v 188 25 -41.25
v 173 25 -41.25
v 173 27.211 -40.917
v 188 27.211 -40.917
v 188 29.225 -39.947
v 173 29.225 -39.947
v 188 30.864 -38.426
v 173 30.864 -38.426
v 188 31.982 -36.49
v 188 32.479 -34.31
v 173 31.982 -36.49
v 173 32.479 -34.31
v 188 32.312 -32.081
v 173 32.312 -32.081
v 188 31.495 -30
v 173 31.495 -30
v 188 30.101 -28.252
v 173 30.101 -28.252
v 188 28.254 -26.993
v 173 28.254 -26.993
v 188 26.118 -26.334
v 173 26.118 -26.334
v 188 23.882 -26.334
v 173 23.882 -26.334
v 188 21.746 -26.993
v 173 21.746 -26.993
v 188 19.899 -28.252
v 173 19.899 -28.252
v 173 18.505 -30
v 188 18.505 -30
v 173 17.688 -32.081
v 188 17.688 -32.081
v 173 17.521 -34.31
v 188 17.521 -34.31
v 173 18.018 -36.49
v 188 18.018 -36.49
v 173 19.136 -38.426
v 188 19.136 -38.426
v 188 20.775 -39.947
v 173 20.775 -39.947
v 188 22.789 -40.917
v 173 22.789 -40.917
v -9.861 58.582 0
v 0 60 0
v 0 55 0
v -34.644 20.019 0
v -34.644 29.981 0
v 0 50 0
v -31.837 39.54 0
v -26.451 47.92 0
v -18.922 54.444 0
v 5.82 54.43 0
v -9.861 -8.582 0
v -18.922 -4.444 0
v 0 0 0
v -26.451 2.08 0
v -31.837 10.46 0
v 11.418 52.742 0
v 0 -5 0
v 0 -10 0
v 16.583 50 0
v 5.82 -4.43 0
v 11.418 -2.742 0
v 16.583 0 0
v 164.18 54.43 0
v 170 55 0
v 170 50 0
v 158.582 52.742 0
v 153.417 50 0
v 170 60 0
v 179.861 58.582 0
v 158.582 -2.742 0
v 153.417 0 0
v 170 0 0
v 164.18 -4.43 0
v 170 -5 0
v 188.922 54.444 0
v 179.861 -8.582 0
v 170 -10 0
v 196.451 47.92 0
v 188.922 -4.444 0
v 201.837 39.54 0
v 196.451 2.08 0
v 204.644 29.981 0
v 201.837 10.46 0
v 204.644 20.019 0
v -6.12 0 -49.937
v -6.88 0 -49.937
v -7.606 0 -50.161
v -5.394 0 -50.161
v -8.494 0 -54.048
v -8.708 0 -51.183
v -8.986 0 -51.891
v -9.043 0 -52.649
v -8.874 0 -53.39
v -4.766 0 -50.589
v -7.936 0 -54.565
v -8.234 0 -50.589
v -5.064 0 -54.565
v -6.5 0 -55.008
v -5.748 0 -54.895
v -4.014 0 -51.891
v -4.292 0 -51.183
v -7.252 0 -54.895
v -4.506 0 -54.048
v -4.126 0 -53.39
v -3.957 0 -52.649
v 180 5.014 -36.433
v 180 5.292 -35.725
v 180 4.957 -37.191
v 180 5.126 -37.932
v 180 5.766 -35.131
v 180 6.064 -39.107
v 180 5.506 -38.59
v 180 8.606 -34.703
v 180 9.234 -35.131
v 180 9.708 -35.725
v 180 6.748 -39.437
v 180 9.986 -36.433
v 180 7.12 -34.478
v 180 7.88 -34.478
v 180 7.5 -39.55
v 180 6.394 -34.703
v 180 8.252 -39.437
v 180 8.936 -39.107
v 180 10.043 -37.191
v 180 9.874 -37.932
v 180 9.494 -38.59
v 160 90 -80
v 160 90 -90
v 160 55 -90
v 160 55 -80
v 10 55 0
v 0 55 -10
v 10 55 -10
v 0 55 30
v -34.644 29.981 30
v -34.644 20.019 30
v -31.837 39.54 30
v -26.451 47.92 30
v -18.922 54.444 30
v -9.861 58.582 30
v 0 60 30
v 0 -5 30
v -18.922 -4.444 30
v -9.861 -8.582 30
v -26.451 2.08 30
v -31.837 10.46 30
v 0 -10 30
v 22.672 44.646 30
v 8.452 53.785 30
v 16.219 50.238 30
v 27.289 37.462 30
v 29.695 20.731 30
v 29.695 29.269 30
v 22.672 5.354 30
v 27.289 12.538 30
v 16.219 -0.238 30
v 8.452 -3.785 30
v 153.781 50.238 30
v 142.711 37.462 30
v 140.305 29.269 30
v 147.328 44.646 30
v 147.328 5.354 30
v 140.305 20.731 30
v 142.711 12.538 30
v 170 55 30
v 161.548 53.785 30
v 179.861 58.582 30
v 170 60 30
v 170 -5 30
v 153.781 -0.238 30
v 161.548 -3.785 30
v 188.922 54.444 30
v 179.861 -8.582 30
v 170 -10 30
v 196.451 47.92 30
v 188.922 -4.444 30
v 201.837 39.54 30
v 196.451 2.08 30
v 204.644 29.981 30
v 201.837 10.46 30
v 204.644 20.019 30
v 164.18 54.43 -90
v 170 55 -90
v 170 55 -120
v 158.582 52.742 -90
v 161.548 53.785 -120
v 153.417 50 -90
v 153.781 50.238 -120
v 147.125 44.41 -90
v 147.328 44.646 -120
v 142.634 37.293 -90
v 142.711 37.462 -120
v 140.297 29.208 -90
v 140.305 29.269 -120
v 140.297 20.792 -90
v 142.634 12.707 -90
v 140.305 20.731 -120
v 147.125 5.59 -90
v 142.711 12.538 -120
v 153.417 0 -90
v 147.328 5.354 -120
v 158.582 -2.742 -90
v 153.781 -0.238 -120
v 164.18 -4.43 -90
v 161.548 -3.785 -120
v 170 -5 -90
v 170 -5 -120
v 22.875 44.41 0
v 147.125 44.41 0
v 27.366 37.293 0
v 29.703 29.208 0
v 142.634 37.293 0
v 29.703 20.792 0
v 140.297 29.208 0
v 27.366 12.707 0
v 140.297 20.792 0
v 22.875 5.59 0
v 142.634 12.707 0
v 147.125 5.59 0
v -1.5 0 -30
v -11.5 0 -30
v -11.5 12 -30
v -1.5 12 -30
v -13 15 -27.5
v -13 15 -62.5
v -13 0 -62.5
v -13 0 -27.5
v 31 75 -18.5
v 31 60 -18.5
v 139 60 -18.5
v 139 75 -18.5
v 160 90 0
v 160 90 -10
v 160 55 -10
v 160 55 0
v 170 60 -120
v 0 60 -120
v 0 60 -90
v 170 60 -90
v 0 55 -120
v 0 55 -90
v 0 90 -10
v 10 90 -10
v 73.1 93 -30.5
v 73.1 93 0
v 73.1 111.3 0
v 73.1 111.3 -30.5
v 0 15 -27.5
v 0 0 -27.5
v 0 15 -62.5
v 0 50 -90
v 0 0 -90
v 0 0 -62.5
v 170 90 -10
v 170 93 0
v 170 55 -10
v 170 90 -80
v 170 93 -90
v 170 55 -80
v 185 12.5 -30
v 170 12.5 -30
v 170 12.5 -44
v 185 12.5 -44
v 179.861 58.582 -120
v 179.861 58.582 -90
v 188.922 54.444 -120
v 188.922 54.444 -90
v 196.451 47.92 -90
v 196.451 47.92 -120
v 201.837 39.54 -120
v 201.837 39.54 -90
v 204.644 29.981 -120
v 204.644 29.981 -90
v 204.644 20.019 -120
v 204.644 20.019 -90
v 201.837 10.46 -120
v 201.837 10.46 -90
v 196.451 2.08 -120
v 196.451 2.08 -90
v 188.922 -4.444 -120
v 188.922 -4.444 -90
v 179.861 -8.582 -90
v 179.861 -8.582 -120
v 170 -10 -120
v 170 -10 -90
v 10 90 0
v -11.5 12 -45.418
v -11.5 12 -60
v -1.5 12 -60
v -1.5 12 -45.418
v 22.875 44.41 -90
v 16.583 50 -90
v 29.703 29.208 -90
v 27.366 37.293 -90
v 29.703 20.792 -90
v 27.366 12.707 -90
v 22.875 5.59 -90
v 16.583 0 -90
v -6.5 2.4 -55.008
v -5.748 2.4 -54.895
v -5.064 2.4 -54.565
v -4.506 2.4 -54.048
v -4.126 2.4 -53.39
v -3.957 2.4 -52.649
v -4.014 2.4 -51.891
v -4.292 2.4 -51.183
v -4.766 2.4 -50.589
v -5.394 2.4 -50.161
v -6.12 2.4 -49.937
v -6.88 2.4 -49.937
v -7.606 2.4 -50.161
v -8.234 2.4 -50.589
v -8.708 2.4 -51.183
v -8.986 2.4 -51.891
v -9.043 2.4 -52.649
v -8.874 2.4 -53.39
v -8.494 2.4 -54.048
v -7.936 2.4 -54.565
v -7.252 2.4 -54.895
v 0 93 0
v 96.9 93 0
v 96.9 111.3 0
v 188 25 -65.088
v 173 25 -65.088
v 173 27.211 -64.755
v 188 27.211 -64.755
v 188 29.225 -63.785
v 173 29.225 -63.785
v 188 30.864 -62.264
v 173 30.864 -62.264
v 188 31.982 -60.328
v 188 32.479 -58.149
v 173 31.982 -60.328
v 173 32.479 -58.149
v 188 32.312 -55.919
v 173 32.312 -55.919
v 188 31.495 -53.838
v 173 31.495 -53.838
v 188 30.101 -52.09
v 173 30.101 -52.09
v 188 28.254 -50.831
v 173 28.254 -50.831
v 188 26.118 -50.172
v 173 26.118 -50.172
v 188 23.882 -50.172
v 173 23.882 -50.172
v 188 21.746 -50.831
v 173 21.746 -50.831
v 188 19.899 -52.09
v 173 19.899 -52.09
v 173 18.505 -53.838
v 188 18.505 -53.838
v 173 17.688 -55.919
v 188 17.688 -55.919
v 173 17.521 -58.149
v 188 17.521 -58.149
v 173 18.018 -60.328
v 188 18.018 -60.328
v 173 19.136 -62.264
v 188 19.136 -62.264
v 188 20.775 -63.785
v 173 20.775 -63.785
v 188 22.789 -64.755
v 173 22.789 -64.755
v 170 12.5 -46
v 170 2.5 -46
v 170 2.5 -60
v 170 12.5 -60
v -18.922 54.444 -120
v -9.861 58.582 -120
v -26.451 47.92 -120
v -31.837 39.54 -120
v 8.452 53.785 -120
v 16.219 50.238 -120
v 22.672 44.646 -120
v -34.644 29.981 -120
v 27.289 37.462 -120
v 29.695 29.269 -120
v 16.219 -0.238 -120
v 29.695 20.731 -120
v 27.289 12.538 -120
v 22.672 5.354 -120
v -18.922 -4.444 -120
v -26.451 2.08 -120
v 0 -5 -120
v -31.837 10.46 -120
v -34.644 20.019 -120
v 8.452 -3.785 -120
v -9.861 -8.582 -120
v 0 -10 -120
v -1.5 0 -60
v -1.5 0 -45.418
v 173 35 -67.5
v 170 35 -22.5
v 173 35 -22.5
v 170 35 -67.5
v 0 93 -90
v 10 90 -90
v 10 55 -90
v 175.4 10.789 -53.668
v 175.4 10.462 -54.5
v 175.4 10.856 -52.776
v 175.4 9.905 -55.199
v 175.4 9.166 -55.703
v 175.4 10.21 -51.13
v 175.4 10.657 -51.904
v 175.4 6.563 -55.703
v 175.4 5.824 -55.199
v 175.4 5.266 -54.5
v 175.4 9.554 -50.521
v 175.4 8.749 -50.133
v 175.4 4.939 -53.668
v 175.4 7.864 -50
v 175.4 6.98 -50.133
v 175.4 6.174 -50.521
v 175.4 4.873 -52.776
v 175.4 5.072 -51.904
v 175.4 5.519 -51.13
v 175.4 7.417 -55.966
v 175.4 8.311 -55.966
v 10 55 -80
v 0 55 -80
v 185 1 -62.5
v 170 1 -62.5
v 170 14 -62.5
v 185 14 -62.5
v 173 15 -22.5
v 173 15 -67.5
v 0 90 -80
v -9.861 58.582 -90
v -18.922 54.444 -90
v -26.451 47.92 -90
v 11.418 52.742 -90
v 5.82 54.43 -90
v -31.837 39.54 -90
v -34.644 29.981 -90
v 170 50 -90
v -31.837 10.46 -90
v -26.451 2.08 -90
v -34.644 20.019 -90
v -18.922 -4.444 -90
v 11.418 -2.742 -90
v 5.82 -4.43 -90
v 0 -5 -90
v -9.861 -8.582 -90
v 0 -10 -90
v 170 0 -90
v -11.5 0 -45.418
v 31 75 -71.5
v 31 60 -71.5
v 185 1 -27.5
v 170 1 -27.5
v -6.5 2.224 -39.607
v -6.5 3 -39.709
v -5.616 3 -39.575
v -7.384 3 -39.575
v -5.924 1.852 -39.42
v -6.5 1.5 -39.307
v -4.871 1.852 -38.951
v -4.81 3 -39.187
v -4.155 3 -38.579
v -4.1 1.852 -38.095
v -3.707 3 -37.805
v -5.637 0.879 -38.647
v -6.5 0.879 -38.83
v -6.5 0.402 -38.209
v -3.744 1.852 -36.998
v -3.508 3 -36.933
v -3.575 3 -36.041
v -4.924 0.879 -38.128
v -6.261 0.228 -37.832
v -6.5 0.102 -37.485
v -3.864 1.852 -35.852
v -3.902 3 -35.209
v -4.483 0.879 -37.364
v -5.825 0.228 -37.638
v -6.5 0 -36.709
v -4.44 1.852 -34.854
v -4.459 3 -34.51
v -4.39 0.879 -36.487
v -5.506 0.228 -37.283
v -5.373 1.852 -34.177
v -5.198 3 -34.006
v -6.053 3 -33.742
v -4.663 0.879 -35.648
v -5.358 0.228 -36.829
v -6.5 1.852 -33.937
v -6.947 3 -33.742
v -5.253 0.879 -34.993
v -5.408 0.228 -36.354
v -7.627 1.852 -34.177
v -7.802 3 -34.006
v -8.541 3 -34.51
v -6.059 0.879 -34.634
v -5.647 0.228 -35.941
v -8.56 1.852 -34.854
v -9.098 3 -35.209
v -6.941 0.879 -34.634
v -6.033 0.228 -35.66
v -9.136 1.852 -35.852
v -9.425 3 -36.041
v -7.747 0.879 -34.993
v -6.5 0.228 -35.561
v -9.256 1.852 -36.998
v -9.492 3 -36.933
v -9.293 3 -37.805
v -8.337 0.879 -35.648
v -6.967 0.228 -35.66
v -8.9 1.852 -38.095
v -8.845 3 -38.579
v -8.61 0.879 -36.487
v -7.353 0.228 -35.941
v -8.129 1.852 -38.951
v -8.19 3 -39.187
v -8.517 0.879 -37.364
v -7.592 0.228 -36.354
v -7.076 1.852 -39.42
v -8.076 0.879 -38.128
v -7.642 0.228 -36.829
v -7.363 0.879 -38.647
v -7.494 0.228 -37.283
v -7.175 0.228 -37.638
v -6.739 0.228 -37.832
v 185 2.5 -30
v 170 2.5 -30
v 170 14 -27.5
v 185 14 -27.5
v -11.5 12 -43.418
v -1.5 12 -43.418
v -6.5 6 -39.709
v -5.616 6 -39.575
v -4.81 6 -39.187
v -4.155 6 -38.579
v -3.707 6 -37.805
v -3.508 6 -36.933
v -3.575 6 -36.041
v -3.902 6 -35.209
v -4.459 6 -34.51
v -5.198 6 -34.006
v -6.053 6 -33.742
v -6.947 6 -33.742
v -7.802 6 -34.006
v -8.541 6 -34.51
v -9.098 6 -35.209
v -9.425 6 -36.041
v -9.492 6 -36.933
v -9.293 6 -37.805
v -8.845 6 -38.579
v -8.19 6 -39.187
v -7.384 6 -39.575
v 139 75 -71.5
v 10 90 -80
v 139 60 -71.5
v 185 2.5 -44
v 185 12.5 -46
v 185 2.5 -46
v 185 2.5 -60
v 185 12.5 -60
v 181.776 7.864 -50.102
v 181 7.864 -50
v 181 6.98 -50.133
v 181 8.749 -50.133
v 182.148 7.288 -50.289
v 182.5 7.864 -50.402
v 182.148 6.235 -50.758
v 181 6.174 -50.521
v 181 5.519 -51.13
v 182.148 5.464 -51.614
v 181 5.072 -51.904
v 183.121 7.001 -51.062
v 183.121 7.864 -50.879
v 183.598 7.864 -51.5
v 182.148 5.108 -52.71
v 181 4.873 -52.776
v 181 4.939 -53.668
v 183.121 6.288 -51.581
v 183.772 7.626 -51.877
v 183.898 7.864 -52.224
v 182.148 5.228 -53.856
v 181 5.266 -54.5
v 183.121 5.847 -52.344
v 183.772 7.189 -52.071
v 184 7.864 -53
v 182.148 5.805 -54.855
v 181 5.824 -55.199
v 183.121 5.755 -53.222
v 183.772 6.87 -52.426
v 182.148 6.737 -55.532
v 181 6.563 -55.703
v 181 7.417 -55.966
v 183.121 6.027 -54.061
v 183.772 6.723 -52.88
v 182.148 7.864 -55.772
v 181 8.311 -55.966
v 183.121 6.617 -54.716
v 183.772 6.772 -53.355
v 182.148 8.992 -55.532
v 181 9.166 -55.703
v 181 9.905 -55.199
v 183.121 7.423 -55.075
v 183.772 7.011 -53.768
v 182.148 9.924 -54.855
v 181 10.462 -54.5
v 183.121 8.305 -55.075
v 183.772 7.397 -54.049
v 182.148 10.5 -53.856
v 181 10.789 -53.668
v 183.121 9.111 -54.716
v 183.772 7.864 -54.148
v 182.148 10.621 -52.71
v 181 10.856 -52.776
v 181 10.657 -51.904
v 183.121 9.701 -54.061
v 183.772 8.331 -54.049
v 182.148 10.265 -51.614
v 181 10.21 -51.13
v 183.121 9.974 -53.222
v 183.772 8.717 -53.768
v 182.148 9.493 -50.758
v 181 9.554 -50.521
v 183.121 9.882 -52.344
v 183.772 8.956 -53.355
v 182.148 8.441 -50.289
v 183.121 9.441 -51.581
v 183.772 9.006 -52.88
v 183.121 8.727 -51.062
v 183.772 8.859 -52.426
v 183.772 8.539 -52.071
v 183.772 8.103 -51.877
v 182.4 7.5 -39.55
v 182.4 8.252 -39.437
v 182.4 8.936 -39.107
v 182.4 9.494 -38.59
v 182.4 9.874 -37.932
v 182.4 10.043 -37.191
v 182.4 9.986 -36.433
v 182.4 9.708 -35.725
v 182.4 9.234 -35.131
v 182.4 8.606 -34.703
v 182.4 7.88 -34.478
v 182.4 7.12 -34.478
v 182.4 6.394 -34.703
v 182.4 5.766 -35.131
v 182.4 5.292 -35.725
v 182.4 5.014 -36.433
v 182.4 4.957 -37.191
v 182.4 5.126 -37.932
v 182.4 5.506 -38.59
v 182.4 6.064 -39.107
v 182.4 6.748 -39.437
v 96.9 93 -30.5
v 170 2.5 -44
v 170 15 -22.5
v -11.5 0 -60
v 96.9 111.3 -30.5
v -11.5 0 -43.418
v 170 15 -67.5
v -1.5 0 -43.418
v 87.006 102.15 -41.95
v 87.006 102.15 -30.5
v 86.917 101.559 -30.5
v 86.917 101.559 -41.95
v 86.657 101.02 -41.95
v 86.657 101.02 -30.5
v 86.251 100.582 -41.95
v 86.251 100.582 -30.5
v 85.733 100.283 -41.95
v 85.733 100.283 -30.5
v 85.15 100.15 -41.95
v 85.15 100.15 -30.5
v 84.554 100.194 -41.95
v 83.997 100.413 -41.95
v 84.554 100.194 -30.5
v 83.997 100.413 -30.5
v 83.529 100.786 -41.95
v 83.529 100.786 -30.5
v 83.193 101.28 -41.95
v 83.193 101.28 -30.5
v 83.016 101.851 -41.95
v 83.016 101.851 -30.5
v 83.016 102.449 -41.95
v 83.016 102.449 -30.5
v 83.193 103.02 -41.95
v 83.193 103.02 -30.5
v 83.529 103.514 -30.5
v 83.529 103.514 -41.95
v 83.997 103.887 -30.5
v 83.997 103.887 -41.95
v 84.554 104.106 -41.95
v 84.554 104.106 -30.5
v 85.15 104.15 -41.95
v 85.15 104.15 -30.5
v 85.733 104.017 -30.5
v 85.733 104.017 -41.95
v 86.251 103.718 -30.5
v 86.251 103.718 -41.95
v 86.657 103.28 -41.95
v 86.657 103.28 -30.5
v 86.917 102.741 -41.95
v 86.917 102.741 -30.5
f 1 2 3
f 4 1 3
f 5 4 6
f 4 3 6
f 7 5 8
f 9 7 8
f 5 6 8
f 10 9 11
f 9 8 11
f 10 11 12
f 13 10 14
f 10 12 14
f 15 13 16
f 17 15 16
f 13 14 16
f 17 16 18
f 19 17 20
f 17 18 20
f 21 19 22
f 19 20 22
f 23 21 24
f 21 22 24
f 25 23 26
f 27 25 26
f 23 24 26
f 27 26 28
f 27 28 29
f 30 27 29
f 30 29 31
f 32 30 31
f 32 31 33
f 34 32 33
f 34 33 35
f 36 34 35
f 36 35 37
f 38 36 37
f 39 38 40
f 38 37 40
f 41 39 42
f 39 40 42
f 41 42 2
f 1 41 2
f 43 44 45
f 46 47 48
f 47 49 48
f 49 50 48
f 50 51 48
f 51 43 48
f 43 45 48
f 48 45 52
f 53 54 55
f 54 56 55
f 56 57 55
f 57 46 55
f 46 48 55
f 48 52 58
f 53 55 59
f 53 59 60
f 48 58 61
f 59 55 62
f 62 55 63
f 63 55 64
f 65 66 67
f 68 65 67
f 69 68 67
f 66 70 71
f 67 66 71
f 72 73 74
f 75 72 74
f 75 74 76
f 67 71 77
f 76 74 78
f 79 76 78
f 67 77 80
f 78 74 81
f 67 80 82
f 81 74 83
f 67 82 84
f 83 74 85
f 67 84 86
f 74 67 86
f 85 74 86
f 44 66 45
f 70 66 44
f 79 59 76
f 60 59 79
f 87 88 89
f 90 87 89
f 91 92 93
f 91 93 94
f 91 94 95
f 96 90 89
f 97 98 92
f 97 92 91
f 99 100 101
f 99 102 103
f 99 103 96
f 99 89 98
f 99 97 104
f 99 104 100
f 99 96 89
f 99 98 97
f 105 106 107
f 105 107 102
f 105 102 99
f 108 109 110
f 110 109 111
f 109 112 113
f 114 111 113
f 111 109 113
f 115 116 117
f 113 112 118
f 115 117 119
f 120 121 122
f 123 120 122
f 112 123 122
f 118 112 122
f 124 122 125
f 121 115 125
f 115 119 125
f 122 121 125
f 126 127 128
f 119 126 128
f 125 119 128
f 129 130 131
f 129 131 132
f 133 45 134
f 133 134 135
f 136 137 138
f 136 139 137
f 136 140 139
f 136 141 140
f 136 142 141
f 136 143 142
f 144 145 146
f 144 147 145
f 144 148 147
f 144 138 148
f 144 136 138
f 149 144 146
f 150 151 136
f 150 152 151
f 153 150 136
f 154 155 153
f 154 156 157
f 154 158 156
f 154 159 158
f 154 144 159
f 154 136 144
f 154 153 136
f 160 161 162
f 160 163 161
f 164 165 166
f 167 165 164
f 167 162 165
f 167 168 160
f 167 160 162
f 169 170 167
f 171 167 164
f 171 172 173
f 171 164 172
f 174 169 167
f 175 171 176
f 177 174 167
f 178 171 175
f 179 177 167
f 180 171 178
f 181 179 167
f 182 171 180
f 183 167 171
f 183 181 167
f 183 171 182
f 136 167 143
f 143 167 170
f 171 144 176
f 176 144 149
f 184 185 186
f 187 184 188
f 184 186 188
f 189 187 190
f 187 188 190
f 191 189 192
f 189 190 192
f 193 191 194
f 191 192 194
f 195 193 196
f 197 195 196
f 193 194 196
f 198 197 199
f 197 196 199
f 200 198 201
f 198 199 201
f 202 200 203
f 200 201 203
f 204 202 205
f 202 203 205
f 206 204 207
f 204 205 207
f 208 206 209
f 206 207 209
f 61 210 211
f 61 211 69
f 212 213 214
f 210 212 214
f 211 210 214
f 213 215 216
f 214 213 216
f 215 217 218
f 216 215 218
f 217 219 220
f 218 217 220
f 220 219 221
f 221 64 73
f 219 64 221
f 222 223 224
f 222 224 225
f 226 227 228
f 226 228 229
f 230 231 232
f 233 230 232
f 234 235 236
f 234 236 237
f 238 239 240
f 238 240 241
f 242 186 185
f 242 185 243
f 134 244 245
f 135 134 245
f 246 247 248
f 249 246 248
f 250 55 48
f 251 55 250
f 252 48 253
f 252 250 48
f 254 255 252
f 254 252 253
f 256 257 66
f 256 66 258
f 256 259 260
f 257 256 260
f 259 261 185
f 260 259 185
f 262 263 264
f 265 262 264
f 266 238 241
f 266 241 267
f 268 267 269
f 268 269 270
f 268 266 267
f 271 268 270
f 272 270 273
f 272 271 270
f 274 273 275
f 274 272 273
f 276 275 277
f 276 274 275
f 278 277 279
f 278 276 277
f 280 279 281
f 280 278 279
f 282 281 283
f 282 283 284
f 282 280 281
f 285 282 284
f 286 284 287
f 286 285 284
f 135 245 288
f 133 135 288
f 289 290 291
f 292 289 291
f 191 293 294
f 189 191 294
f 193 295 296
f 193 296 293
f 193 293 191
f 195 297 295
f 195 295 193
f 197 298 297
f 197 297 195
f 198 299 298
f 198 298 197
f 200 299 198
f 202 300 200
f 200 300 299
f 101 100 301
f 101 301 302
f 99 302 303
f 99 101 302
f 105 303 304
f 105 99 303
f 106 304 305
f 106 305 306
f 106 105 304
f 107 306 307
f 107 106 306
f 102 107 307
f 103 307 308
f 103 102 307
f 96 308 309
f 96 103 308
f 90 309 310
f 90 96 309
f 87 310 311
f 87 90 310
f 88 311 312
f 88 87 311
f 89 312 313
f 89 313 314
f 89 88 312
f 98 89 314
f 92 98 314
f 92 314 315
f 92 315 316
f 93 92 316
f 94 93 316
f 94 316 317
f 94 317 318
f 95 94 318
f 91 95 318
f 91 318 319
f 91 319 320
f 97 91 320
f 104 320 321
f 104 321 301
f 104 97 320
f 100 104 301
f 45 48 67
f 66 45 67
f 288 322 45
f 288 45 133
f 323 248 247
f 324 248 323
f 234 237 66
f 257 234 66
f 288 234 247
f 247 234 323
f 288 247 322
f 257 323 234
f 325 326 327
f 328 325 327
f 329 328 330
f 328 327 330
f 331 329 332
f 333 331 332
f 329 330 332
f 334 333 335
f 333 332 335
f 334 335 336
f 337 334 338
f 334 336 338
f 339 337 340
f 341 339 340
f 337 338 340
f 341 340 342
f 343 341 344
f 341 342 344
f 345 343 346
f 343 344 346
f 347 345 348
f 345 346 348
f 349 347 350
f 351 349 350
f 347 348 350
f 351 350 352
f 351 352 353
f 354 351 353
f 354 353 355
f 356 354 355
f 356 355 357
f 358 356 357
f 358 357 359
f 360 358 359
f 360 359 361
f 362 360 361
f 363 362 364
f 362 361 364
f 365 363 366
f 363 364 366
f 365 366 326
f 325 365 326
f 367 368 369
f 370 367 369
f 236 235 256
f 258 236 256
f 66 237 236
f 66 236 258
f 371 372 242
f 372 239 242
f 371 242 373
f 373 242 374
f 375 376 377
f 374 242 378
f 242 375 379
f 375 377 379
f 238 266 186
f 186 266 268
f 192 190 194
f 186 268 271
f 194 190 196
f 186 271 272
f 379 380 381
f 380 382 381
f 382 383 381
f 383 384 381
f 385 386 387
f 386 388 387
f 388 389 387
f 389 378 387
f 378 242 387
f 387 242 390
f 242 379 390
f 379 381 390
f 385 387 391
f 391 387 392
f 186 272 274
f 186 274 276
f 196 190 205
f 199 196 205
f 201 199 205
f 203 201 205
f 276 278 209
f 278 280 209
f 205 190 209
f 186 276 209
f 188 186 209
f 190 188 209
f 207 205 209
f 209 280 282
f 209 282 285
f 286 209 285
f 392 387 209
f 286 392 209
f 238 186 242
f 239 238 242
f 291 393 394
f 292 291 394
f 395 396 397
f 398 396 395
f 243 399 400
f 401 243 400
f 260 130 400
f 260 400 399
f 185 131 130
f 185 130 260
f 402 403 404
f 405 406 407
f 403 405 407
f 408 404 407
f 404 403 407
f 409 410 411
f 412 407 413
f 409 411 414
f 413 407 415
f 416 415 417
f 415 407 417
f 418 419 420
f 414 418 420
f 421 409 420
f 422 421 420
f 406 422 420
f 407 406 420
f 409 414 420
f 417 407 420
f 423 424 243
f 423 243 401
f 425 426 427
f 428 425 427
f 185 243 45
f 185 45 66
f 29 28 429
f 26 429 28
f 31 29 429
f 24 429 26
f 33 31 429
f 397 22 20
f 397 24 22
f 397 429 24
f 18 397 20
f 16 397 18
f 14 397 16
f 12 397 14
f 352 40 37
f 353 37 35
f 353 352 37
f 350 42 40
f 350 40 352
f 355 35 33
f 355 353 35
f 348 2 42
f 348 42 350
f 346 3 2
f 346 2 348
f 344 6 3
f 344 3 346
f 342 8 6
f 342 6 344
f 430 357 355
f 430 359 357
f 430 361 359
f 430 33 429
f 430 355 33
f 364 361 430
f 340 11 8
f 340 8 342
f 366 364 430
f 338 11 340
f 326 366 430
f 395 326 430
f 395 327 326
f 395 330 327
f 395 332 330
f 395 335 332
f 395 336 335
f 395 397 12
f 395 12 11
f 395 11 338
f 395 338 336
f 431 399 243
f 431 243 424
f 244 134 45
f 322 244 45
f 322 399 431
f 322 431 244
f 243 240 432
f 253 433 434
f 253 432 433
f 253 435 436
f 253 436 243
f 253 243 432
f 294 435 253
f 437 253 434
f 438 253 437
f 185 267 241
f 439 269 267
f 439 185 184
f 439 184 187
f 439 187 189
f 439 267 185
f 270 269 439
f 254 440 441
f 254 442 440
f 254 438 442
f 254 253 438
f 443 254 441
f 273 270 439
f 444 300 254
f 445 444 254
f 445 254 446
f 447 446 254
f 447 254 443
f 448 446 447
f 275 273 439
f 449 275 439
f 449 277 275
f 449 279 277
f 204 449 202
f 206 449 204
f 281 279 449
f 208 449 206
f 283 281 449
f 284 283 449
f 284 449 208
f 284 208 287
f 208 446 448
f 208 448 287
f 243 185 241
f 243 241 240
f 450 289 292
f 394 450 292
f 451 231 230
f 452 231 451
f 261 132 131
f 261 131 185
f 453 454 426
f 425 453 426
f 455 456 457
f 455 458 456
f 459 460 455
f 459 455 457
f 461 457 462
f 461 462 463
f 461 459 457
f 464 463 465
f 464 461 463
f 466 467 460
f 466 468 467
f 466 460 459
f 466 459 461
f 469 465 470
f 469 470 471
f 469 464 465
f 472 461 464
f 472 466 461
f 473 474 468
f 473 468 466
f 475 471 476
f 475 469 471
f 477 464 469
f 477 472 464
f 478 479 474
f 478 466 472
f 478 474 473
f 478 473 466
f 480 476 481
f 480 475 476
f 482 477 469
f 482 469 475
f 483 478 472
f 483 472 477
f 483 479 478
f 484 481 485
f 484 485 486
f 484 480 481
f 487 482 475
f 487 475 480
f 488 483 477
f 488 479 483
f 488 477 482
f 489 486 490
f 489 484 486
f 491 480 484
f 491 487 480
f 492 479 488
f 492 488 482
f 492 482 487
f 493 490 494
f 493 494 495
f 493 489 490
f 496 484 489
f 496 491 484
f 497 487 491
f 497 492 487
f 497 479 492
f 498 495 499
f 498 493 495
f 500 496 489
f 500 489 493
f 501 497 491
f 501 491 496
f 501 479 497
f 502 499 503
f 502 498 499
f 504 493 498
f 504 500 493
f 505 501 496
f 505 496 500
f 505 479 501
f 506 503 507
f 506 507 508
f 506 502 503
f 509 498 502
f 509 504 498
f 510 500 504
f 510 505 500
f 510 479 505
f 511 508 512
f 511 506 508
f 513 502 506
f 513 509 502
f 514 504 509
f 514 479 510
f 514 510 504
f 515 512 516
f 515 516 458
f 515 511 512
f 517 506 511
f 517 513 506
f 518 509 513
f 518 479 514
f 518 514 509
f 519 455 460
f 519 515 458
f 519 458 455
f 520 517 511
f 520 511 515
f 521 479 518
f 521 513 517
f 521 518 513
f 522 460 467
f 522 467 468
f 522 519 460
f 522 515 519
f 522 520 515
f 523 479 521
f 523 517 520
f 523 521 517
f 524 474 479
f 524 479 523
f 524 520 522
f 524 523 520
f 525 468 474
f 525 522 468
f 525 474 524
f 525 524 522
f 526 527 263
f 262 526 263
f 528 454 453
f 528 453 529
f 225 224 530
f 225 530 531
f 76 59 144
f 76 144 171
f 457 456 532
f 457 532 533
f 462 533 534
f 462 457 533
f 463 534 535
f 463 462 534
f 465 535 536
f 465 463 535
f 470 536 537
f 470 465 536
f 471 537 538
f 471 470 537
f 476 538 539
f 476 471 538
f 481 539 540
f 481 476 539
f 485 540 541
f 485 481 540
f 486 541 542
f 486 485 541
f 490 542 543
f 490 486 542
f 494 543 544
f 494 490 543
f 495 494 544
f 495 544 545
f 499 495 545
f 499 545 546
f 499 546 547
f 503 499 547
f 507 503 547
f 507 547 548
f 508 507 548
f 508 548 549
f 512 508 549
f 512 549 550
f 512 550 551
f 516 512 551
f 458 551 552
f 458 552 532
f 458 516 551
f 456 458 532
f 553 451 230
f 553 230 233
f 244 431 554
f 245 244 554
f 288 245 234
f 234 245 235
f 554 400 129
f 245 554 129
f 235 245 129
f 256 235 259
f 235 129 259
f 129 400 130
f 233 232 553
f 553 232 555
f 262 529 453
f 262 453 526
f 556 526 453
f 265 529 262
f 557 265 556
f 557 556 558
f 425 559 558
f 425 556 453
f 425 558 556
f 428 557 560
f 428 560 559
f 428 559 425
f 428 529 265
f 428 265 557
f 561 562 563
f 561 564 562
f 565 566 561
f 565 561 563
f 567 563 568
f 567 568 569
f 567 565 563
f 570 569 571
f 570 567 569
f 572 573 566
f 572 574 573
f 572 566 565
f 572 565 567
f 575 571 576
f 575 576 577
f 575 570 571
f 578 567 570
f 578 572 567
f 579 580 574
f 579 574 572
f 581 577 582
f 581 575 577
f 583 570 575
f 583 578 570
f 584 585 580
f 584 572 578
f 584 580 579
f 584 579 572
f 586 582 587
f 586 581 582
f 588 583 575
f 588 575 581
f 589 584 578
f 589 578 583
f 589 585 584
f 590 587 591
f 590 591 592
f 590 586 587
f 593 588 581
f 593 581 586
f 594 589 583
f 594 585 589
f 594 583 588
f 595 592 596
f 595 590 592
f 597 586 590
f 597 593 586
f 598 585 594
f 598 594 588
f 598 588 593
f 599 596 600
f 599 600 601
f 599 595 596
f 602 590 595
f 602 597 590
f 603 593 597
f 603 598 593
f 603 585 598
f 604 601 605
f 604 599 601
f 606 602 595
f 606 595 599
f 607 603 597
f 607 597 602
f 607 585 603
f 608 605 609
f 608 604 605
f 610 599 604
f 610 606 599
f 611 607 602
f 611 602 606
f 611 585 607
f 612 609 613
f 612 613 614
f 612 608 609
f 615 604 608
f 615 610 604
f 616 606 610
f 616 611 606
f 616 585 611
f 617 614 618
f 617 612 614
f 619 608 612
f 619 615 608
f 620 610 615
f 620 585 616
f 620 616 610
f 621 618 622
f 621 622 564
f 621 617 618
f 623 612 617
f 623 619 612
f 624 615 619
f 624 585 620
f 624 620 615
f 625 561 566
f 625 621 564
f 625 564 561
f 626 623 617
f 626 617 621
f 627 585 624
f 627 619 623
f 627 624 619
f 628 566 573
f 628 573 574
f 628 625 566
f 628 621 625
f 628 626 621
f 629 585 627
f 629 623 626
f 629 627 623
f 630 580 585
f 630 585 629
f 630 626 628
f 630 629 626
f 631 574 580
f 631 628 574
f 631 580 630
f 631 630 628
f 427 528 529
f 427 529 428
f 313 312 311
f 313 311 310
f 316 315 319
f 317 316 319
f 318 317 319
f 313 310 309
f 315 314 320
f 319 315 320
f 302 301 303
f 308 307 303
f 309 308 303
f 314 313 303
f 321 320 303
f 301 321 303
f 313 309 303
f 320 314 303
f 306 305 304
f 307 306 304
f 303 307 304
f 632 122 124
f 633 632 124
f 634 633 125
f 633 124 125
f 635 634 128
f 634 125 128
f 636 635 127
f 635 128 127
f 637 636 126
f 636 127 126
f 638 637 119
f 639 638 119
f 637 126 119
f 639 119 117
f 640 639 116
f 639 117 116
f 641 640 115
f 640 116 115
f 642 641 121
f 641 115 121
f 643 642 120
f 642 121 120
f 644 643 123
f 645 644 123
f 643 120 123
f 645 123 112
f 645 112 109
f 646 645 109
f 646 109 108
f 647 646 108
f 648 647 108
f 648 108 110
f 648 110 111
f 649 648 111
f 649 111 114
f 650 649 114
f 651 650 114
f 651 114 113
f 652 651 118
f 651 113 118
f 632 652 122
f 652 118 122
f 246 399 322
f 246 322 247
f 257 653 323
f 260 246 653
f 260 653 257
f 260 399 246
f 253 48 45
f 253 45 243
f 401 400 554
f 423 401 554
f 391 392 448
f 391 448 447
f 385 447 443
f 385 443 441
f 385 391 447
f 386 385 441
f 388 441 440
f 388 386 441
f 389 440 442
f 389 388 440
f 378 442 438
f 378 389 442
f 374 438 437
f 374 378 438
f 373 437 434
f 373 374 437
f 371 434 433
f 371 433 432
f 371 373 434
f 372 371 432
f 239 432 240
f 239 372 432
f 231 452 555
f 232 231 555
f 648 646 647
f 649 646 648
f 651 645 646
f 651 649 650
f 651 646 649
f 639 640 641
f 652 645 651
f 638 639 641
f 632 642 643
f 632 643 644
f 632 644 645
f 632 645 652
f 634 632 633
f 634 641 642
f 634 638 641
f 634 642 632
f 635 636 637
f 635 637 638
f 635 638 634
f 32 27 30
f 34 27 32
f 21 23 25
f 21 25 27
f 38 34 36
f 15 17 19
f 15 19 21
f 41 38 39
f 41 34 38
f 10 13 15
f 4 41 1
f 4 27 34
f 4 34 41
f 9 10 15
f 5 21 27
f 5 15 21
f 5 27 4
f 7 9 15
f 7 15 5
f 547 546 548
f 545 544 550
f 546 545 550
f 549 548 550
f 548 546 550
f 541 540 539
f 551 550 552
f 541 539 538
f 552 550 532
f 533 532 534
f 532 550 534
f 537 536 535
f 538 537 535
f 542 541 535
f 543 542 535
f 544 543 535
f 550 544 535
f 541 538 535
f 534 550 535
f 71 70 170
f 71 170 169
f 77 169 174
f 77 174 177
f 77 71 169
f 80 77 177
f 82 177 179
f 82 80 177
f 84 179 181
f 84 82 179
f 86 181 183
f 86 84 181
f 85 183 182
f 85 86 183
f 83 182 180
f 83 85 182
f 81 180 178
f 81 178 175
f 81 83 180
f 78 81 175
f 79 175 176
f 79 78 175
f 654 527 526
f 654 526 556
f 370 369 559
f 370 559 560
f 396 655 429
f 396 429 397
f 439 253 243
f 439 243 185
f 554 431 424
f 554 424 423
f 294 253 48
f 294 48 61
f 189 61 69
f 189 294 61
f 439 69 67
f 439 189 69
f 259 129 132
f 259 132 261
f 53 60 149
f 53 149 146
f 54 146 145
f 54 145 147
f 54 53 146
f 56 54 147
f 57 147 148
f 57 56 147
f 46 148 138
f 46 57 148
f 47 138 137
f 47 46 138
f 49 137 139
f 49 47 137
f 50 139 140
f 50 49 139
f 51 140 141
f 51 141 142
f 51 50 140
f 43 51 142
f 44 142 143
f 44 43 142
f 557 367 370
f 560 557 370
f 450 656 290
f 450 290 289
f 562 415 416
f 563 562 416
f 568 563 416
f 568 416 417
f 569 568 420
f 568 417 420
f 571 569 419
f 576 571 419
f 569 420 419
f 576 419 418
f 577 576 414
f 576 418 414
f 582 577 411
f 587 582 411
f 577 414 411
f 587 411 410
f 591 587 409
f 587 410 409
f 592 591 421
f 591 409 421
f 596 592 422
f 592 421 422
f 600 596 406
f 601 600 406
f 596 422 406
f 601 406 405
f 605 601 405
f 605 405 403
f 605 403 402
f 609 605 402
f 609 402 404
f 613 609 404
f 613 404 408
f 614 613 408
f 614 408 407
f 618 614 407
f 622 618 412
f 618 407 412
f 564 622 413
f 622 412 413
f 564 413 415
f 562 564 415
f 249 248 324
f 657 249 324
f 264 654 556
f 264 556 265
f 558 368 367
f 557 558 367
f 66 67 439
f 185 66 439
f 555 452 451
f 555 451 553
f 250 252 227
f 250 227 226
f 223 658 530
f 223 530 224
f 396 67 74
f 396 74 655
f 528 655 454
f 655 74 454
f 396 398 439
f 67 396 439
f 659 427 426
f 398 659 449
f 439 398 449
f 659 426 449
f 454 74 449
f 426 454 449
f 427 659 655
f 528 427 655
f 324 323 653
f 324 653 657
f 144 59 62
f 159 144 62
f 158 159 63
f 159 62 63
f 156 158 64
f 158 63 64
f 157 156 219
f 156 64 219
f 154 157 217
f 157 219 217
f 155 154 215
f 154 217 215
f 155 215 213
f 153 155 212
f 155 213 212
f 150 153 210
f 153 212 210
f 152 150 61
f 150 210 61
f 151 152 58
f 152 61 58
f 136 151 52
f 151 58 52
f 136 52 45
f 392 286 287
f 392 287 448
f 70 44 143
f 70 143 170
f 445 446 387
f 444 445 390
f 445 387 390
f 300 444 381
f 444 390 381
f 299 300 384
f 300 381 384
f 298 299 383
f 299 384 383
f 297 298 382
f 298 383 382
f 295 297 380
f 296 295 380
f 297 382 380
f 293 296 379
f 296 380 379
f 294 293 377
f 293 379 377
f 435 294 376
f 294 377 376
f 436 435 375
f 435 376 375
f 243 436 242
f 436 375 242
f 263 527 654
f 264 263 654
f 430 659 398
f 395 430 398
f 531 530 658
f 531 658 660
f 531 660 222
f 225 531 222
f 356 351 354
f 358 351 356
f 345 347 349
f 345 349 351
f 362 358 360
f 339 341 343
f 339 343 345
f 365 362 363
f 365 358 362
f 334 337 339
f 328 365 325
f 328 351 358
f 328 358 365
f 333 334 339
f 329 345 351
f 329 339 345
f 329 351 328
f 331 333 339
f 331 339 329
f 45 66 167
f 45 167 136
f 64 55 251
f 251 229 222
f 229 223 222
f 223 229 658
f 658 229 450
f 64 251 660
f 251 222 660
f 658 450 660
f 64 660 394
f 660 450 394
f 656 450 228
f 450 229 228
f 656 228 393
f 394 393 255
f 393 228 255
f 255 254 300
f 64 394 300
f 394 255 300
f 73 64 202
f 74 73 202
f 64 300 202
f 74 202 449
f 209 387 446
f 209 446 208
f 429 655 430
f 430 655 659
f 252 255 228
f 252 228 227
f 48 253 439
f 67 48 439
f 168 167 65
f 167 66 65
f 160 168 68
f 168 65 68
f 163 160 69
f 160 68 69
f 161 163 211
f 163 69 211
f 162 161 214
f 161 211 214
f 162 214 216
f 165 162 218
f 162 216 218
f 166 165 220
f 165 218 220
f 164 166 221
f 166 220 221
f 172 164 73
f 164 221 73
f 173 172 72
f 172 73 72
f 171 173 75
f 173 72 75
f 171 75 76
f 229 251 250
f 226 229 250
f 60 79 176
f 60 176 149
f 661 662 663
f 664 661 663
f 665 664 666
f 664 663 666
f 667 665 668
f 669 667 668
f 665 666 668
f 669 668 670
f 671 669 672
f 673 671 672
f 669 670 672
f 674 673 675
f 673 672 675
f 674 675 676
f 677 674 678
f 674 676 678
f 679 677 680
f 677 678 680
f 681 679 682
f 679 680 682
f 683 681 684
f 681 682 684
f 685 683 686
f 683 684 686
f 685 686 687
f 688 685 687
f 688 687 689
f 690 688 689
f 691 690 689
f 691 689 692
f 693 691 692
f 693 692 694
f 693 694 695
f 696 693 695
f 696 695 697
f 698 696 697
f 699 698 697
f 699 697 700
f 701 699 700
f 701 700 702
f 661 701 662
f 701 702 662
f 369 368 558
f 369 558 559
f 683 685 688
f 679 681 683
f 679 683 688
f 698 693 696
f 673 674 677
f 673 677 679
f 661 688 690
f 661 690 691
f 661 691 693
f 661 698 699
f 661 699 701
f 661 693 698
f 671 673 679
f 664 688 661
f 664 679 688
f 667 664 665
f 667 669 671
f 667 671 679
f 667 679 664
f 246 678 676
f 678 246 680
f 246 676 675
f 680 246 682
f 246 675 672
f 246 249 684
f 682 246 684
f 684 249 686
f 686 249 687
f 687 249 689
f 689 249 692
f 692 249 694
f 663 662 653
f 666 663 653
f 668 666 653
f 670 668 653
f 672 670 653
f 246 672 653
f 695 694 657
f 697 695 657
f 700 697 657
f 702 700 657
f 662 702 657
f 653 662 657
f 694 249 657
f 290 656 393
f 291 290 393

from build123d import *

# Parameters (mm, degrees)
SKETCH1_W            = 170
SKETCH1_H            = 90
BOSS_EXTRUDE1_DEPTH  = 50
SKETCH2_R            = 30
BOSS_EXTRUDE2_DEPTH  = 30
LPATTERN1_COUNT      = 2
LPATTERN1_PITCH      = 120
BOSS_EXTRUDE3_START  = -30
BOSS_EXTRUDE3_DEPTH  = 30
LPATTERN2_COUNT      = 2
LPATTERN2_PITCH      = 120
SKETCH4_W            = 170
SKETCH4_H            = 90
BOSS_EXTRUDE6_DEPTH  = 5
SKETCH6_W            = 108
SKETCH6_H            = 53
BOSS_EXTRUDE7_DEPTH  = 15
SKETCH7_W            = 170
SKETCH7_H            = 90
BOSS_EXTRUDE8_DEPTH  = 3
SKETCH8_W            = 23.8
SKETCH8_H            = 18.3
BOSS_EXTRUDE9_DEPTH  = 30.5
SKETCH9_R            = 2.00605959
BOSS_EXTRUDE10_DEPTH = 11.45
SKETCH10_W           = 45
SKETCH10_H           = 20
BOSS_EXTRUDE11_DEPTH = 3
SKETCH11_R           = 7.5
BOSS_EXTRUDE12_DEPTH = 15
SKETCH12_W           = 35
SKETCH12_H           = 13
SKETCH12_W_2         = 14
SKETCH12_H_2         = 10
BOSS_EXTRUDE13_DEPTH = 15
SKETCH13_R           = 2.55
BOSS_EXTRUDE14_DEPTH = 2.4
SKETCH14_R           = 3
BOSS_EXTRUDE15_DEPTH = 8.6
FILLET1_R            = 3
SKETCH15_W           = 35
SKETCH15_H           = 15
BOSS_EXTRUDE16_DEPTH = 13
SKETCH17_W           = 10
SKETCH17_H           = 30
CUT_EXTRUDE1_DEPTH   = 12
SKETCH18_W           = 10
SKETCH18_H           = 2
BOSS_EXTRUDE17_DEPTH = 12
SKETCH20_W           = 10
SKETCH20_H           = 10
BOSS_EXTRUDE20_DEPTH = 35
SKETCH21_R           = 2.55
BOSS_EXTRUDE21_DEPTH = 2.4
SKETCH24_R           = 3
BOSS_EXTRUDE22_DEPTH = 6
FILLET2_R            = 3


with BuildPart() as part:
    # Sketch1 → Boss-Extrude1 (new body)
    with BuildSketch(Plane(origin=(0, 0, 0), x_dir=(1, 0, 0), z_dir=(0, 1, 0))):
        with Locations((85, 45)):
            Rectangle(SKETCH1_W, SKETCH1_H)
    extrude(amount=BOSS_EXTRUDE1_DEPTH)

    # Sketch2 → Boss-Extrude2 (add)
    with BuildSketch(Plane.XY):
        with Locations(Location((170, 25, 0), (0, 0, 236.442690238))):
            Circle(SKETCH2_R)
        with Locations(Location((0, 25, 0), (0, 0, 303.557309762))):
            Circle(SKETCH2_R)
    boss_extrude2 = extrude(amount=BOSS_EXTRUDE2_DEPTH)

    # LPattern1: Boss-Extrude2 ×2
    with Locations(*[(0, 0, -i * LPATTERN1_PITCH) for i in range(1, LPATTERN1_COUNT)]):
        add(boss_extrude2)

    # Sketch3 → Boss-Extrude3 (add)
    with BuildSketch(Plane.XY.offset(30).offset(BOSS_EXTRUDE3_START)):
        with BuildLine():
            Line((0, 60), (170, 60))
            ThreePointArc((170, 60), (205, 25), (170, -10))
            Line((170, -10), (0, -10))
            ThreePointArc((0, -10), (-35, 25), (0, 60))
        make_face()
        with BuildLine():
            Line((170, 55), (0, 55))
            ThreePointArc((0, 55), (-30, 25), (0, -5))
            Line((0, -5), (170, -5))
            ThreePointArc((170, -5), (200, 25), (170, 55))
        make_face(mode=Mode.SUBTRACT)
    boss_extrude3 = extrude(amount=BOSS_EXTRUDE3_DEPTH)

    # LPattern2: Boss-Extrude3 ×2
    with Locations(*[(0, 0, -i * LPATTERN2_PITCH) for i in range(1, LPATTERN2_COUNT)]):
        add(boss_extrude3)

    # Sketch10 → Boss-Extrude11 (add)
    with BuildSketch(Plane(origin=(170, 0, 0), x_dir=(0, 0, -1), z_dir=(1, 0, 0))):
        with Locations((45, 25)):
            Rectangle(SKETCH10_W, SKETCH10_H)
    extrude(amount=BOSS_EXTRUDE11_DEPTH)

    # Sketch11 → Boss-Extrude12 (add)
    with BuildSketch(Plane(origin=(173, 0, 0), x_dir=(0, 0, -1), z_dir=(1, 0, 0))):
        with Locations((57.588236396, 25)):
            Circle(SKETCH11_R)
        with Locations((33.75, 25)):
            Circle(SKETCH11_R)
    extrude(amount=BOSS_EXTRUDE12_DEPTH)

    # Sketch12 → Boss-Extrude13 (add)
    with BuildSketch(Plane(origin=(170, 0, 0), x_dir=(0, 0, -1), z_dir=(1, 0, 0))):
        with Locations((45, 7.5)):
            Rectangle(SKETCH12_W, SKETCH12_H)
        with Locations((37, 7.5)):
            Rectangle(SKETCH12_W_2, SKETCH12_H_2, mode=Mode.SUBTRACT)
        with Locations((53, 7.5)):
            Rectangle(SKETCH12_W_2, SKETCH12_H_2, mode=Mode.SUBTRACT)
    extrude(amount=BOSS_EXTRUDE13_DEPTH)

    # Sketch15 → Boss-Extrude16 (add)
    with BuildSketch(Plane.ZY):
        with Locations((-45, 7.5)):
            Rectangle(SKETCH15_W, SKETCH15_H)
    extrude(amount=BOSS_EXTRUDE16_DEPTH)

    # Sketch17 → Cut-Extrude1 (cut)
    with BuildSketch(Plane.XZ):
        with Locations((-6.5, -45)):
            Rectangle(SKETCH17_W, SKETCH17_H)
    extrude(amount=-CUT_EXTRUDE1_DEPTH, mode=Mode.SUBTRACT)

    # Sketch18 → Boss-Extrude17 (add)
    with BuildSketch(Plane.XZ.offset(-12)):
        with Locations((-6.5, -44.41753742)):
            Rectangle(SKETCH18_W, SKETCH18_H)
    extrude(amount=BOSS_EXTRUDE17_DEPTH)


with BuildPart() as body_2:
    # Sketch4 → Boss-Extrude6 (new body)
    with BuildSketch(Plane(origin=(0, 50, 0), x_dir=(1, 0, 0), z_dir=(0, 1, 0))):
        with Locations((85, 45)):
            Rectangle(SKETCH4_W, SKETCH4_H)
    extrude(amount=BOSS_EXTRUDE6_DEPTH)


with BuildPart() as body_3:
    # Sketch6 → Boss-Extrude7 (new body)
    with BuildSketch(Plane(origin=(0, 60, 0), x_dir=(1, 0, 0), z_dir=(0, 1, 0))):
        with Locations((85, 45)):
            Rectangle(SKETCH6_W, SKETCH6_H)
    extrude(amount=BOSS_EXTRUDE7_DEPTH)


with BuildPart() as body_4:
    # Sketch7 → Boss-Extrude8 (new body)
    with BuildSketch(Plane(origin=(0, 90, 0), x_dir=(1, 0, 0), z_dir=(0, 1, 0))):
        with Locations((85, 45)):
            Rectangle(SKETCH7_W, SKETCH7_H)
    extrude(amount=BOSS_EXTRUDE8_DEPTH)

    # Sketch8 → Boss-Extrude9 (add)
    with BuildSketch(Plane.XY):
        with Locations((85, 102.15)):
            Rectangle(SKETCH8_W, SKETCH8_H)
    extrude(amount=-BOSS_EXTRUDE9_DEPTH)

    # Sketch9 → Boss-Extrude10 (add)
    with BuildSketch(Plane(origin=(0, 0, -30.5), x_dir=(-1, 0, 0), z_dir=(0, 0, -1))):
        with Locations(Location((-85, 102.15, 0), (0, 0, 180))):
            Circle(SKETCH9_R)
    extrude(amount=BOSS_EXTRUDE10_DEPTH)

    # Sketch20 → Boss-Extrude20 (add)
    with BuildSketch(Plane.XZ.offset(-90)):
        with Locations((5, -5)):
            Rectangle(SKETCH20_W, SKETCH20_H)
        with Locations((165, -5)):
            Rectangle(SKETCH20_W, SKETCH20_H)
        with Locations((165, -85)):
            Rectangle(SKETCH20_W, SKETCH20_H)
        with Locations((5, -85)):
            Rectangle(SKETCH20_W, SKETCH20_H)
    extrude(amount=BOSS_EXTRUDE20_DEPTH)


with BuildPart() as body_5:
    # Sketch13 → Boss-Extrude14 (new body)
    with BuildSketch(Plane(origin=(180, 0, 0), x_dir=(0, 0, -1), z_dir=(1, 0, 0))):
        with Locations((37, 7.5)):
            Circle(SKETCH13_R)
    extrude(amount=BOSS_EXTRUDE14_DEPTH)


with BuildPart() as body_6:
    # Sketch14 → Boss-Extrude15 (new body)
    with BuildSketch(Plane(origin=(175.4, 0, 0), x_dir=(0, 0, -1), z_dir=(1, 0, 0))):
        with Locations(Location((53, 7.864274774, 0), (0, 0, 180))):
            Circle(SKETCH14_R)
    extrude(amount=BOSS_EXTRUDE15_DEPTH)

    # Fillet1
    fillet1_edges = [body_6.edges().sort_by_distance(p)[0] for p in [
        (184, 7.864274774, -56),
    ]]
    fillet(fillet1_edges, radius=FILLET1_R)


with BuildPart() as body_7:
    # Sketch21 → Boss-Extrude21 (new body)
    with BuildSketch(Plane(origin=(0, 0, 0), x_dir=(-1, 0, 0), z_dir=(0, -1, 0))):
        with Locations(Location((6.5, 52.458149235, 0), (0, 0, 90))):
            Circle(SKETCH21_R)
    extrude(amount=-BOSS_EXTRUDE21_DEPTH)


with BuildPart() as body_8:
    # Sketch24 → Boss-Extrude22 (new body)
    with BuildSketch(Plane(origin=(0, 0, 0), x_dir=(-1, 0, 0), z_dir=(0, -1, 0))):
        with Locations(Location((6.5, 36.70876871, 0), (0, 0, 90))):
            Circle(SKETCH24_R)
    extrude(amount=-BOSS_EXTRUDE22_DEPTH)

    # Fillet2
    fillet2_edges = [body_8.edges().sort_by_distance(p)[0] for p in [
        (-6.5, 0, -33.70876871),
    ]]
    fillet(fillet2_edges, radius=FILLET2_R)


solid = Compound([part.part, body_2.part, body_3.part, body_4.part, body_5.part, body_6.part, body_7.part, body_8.part])
